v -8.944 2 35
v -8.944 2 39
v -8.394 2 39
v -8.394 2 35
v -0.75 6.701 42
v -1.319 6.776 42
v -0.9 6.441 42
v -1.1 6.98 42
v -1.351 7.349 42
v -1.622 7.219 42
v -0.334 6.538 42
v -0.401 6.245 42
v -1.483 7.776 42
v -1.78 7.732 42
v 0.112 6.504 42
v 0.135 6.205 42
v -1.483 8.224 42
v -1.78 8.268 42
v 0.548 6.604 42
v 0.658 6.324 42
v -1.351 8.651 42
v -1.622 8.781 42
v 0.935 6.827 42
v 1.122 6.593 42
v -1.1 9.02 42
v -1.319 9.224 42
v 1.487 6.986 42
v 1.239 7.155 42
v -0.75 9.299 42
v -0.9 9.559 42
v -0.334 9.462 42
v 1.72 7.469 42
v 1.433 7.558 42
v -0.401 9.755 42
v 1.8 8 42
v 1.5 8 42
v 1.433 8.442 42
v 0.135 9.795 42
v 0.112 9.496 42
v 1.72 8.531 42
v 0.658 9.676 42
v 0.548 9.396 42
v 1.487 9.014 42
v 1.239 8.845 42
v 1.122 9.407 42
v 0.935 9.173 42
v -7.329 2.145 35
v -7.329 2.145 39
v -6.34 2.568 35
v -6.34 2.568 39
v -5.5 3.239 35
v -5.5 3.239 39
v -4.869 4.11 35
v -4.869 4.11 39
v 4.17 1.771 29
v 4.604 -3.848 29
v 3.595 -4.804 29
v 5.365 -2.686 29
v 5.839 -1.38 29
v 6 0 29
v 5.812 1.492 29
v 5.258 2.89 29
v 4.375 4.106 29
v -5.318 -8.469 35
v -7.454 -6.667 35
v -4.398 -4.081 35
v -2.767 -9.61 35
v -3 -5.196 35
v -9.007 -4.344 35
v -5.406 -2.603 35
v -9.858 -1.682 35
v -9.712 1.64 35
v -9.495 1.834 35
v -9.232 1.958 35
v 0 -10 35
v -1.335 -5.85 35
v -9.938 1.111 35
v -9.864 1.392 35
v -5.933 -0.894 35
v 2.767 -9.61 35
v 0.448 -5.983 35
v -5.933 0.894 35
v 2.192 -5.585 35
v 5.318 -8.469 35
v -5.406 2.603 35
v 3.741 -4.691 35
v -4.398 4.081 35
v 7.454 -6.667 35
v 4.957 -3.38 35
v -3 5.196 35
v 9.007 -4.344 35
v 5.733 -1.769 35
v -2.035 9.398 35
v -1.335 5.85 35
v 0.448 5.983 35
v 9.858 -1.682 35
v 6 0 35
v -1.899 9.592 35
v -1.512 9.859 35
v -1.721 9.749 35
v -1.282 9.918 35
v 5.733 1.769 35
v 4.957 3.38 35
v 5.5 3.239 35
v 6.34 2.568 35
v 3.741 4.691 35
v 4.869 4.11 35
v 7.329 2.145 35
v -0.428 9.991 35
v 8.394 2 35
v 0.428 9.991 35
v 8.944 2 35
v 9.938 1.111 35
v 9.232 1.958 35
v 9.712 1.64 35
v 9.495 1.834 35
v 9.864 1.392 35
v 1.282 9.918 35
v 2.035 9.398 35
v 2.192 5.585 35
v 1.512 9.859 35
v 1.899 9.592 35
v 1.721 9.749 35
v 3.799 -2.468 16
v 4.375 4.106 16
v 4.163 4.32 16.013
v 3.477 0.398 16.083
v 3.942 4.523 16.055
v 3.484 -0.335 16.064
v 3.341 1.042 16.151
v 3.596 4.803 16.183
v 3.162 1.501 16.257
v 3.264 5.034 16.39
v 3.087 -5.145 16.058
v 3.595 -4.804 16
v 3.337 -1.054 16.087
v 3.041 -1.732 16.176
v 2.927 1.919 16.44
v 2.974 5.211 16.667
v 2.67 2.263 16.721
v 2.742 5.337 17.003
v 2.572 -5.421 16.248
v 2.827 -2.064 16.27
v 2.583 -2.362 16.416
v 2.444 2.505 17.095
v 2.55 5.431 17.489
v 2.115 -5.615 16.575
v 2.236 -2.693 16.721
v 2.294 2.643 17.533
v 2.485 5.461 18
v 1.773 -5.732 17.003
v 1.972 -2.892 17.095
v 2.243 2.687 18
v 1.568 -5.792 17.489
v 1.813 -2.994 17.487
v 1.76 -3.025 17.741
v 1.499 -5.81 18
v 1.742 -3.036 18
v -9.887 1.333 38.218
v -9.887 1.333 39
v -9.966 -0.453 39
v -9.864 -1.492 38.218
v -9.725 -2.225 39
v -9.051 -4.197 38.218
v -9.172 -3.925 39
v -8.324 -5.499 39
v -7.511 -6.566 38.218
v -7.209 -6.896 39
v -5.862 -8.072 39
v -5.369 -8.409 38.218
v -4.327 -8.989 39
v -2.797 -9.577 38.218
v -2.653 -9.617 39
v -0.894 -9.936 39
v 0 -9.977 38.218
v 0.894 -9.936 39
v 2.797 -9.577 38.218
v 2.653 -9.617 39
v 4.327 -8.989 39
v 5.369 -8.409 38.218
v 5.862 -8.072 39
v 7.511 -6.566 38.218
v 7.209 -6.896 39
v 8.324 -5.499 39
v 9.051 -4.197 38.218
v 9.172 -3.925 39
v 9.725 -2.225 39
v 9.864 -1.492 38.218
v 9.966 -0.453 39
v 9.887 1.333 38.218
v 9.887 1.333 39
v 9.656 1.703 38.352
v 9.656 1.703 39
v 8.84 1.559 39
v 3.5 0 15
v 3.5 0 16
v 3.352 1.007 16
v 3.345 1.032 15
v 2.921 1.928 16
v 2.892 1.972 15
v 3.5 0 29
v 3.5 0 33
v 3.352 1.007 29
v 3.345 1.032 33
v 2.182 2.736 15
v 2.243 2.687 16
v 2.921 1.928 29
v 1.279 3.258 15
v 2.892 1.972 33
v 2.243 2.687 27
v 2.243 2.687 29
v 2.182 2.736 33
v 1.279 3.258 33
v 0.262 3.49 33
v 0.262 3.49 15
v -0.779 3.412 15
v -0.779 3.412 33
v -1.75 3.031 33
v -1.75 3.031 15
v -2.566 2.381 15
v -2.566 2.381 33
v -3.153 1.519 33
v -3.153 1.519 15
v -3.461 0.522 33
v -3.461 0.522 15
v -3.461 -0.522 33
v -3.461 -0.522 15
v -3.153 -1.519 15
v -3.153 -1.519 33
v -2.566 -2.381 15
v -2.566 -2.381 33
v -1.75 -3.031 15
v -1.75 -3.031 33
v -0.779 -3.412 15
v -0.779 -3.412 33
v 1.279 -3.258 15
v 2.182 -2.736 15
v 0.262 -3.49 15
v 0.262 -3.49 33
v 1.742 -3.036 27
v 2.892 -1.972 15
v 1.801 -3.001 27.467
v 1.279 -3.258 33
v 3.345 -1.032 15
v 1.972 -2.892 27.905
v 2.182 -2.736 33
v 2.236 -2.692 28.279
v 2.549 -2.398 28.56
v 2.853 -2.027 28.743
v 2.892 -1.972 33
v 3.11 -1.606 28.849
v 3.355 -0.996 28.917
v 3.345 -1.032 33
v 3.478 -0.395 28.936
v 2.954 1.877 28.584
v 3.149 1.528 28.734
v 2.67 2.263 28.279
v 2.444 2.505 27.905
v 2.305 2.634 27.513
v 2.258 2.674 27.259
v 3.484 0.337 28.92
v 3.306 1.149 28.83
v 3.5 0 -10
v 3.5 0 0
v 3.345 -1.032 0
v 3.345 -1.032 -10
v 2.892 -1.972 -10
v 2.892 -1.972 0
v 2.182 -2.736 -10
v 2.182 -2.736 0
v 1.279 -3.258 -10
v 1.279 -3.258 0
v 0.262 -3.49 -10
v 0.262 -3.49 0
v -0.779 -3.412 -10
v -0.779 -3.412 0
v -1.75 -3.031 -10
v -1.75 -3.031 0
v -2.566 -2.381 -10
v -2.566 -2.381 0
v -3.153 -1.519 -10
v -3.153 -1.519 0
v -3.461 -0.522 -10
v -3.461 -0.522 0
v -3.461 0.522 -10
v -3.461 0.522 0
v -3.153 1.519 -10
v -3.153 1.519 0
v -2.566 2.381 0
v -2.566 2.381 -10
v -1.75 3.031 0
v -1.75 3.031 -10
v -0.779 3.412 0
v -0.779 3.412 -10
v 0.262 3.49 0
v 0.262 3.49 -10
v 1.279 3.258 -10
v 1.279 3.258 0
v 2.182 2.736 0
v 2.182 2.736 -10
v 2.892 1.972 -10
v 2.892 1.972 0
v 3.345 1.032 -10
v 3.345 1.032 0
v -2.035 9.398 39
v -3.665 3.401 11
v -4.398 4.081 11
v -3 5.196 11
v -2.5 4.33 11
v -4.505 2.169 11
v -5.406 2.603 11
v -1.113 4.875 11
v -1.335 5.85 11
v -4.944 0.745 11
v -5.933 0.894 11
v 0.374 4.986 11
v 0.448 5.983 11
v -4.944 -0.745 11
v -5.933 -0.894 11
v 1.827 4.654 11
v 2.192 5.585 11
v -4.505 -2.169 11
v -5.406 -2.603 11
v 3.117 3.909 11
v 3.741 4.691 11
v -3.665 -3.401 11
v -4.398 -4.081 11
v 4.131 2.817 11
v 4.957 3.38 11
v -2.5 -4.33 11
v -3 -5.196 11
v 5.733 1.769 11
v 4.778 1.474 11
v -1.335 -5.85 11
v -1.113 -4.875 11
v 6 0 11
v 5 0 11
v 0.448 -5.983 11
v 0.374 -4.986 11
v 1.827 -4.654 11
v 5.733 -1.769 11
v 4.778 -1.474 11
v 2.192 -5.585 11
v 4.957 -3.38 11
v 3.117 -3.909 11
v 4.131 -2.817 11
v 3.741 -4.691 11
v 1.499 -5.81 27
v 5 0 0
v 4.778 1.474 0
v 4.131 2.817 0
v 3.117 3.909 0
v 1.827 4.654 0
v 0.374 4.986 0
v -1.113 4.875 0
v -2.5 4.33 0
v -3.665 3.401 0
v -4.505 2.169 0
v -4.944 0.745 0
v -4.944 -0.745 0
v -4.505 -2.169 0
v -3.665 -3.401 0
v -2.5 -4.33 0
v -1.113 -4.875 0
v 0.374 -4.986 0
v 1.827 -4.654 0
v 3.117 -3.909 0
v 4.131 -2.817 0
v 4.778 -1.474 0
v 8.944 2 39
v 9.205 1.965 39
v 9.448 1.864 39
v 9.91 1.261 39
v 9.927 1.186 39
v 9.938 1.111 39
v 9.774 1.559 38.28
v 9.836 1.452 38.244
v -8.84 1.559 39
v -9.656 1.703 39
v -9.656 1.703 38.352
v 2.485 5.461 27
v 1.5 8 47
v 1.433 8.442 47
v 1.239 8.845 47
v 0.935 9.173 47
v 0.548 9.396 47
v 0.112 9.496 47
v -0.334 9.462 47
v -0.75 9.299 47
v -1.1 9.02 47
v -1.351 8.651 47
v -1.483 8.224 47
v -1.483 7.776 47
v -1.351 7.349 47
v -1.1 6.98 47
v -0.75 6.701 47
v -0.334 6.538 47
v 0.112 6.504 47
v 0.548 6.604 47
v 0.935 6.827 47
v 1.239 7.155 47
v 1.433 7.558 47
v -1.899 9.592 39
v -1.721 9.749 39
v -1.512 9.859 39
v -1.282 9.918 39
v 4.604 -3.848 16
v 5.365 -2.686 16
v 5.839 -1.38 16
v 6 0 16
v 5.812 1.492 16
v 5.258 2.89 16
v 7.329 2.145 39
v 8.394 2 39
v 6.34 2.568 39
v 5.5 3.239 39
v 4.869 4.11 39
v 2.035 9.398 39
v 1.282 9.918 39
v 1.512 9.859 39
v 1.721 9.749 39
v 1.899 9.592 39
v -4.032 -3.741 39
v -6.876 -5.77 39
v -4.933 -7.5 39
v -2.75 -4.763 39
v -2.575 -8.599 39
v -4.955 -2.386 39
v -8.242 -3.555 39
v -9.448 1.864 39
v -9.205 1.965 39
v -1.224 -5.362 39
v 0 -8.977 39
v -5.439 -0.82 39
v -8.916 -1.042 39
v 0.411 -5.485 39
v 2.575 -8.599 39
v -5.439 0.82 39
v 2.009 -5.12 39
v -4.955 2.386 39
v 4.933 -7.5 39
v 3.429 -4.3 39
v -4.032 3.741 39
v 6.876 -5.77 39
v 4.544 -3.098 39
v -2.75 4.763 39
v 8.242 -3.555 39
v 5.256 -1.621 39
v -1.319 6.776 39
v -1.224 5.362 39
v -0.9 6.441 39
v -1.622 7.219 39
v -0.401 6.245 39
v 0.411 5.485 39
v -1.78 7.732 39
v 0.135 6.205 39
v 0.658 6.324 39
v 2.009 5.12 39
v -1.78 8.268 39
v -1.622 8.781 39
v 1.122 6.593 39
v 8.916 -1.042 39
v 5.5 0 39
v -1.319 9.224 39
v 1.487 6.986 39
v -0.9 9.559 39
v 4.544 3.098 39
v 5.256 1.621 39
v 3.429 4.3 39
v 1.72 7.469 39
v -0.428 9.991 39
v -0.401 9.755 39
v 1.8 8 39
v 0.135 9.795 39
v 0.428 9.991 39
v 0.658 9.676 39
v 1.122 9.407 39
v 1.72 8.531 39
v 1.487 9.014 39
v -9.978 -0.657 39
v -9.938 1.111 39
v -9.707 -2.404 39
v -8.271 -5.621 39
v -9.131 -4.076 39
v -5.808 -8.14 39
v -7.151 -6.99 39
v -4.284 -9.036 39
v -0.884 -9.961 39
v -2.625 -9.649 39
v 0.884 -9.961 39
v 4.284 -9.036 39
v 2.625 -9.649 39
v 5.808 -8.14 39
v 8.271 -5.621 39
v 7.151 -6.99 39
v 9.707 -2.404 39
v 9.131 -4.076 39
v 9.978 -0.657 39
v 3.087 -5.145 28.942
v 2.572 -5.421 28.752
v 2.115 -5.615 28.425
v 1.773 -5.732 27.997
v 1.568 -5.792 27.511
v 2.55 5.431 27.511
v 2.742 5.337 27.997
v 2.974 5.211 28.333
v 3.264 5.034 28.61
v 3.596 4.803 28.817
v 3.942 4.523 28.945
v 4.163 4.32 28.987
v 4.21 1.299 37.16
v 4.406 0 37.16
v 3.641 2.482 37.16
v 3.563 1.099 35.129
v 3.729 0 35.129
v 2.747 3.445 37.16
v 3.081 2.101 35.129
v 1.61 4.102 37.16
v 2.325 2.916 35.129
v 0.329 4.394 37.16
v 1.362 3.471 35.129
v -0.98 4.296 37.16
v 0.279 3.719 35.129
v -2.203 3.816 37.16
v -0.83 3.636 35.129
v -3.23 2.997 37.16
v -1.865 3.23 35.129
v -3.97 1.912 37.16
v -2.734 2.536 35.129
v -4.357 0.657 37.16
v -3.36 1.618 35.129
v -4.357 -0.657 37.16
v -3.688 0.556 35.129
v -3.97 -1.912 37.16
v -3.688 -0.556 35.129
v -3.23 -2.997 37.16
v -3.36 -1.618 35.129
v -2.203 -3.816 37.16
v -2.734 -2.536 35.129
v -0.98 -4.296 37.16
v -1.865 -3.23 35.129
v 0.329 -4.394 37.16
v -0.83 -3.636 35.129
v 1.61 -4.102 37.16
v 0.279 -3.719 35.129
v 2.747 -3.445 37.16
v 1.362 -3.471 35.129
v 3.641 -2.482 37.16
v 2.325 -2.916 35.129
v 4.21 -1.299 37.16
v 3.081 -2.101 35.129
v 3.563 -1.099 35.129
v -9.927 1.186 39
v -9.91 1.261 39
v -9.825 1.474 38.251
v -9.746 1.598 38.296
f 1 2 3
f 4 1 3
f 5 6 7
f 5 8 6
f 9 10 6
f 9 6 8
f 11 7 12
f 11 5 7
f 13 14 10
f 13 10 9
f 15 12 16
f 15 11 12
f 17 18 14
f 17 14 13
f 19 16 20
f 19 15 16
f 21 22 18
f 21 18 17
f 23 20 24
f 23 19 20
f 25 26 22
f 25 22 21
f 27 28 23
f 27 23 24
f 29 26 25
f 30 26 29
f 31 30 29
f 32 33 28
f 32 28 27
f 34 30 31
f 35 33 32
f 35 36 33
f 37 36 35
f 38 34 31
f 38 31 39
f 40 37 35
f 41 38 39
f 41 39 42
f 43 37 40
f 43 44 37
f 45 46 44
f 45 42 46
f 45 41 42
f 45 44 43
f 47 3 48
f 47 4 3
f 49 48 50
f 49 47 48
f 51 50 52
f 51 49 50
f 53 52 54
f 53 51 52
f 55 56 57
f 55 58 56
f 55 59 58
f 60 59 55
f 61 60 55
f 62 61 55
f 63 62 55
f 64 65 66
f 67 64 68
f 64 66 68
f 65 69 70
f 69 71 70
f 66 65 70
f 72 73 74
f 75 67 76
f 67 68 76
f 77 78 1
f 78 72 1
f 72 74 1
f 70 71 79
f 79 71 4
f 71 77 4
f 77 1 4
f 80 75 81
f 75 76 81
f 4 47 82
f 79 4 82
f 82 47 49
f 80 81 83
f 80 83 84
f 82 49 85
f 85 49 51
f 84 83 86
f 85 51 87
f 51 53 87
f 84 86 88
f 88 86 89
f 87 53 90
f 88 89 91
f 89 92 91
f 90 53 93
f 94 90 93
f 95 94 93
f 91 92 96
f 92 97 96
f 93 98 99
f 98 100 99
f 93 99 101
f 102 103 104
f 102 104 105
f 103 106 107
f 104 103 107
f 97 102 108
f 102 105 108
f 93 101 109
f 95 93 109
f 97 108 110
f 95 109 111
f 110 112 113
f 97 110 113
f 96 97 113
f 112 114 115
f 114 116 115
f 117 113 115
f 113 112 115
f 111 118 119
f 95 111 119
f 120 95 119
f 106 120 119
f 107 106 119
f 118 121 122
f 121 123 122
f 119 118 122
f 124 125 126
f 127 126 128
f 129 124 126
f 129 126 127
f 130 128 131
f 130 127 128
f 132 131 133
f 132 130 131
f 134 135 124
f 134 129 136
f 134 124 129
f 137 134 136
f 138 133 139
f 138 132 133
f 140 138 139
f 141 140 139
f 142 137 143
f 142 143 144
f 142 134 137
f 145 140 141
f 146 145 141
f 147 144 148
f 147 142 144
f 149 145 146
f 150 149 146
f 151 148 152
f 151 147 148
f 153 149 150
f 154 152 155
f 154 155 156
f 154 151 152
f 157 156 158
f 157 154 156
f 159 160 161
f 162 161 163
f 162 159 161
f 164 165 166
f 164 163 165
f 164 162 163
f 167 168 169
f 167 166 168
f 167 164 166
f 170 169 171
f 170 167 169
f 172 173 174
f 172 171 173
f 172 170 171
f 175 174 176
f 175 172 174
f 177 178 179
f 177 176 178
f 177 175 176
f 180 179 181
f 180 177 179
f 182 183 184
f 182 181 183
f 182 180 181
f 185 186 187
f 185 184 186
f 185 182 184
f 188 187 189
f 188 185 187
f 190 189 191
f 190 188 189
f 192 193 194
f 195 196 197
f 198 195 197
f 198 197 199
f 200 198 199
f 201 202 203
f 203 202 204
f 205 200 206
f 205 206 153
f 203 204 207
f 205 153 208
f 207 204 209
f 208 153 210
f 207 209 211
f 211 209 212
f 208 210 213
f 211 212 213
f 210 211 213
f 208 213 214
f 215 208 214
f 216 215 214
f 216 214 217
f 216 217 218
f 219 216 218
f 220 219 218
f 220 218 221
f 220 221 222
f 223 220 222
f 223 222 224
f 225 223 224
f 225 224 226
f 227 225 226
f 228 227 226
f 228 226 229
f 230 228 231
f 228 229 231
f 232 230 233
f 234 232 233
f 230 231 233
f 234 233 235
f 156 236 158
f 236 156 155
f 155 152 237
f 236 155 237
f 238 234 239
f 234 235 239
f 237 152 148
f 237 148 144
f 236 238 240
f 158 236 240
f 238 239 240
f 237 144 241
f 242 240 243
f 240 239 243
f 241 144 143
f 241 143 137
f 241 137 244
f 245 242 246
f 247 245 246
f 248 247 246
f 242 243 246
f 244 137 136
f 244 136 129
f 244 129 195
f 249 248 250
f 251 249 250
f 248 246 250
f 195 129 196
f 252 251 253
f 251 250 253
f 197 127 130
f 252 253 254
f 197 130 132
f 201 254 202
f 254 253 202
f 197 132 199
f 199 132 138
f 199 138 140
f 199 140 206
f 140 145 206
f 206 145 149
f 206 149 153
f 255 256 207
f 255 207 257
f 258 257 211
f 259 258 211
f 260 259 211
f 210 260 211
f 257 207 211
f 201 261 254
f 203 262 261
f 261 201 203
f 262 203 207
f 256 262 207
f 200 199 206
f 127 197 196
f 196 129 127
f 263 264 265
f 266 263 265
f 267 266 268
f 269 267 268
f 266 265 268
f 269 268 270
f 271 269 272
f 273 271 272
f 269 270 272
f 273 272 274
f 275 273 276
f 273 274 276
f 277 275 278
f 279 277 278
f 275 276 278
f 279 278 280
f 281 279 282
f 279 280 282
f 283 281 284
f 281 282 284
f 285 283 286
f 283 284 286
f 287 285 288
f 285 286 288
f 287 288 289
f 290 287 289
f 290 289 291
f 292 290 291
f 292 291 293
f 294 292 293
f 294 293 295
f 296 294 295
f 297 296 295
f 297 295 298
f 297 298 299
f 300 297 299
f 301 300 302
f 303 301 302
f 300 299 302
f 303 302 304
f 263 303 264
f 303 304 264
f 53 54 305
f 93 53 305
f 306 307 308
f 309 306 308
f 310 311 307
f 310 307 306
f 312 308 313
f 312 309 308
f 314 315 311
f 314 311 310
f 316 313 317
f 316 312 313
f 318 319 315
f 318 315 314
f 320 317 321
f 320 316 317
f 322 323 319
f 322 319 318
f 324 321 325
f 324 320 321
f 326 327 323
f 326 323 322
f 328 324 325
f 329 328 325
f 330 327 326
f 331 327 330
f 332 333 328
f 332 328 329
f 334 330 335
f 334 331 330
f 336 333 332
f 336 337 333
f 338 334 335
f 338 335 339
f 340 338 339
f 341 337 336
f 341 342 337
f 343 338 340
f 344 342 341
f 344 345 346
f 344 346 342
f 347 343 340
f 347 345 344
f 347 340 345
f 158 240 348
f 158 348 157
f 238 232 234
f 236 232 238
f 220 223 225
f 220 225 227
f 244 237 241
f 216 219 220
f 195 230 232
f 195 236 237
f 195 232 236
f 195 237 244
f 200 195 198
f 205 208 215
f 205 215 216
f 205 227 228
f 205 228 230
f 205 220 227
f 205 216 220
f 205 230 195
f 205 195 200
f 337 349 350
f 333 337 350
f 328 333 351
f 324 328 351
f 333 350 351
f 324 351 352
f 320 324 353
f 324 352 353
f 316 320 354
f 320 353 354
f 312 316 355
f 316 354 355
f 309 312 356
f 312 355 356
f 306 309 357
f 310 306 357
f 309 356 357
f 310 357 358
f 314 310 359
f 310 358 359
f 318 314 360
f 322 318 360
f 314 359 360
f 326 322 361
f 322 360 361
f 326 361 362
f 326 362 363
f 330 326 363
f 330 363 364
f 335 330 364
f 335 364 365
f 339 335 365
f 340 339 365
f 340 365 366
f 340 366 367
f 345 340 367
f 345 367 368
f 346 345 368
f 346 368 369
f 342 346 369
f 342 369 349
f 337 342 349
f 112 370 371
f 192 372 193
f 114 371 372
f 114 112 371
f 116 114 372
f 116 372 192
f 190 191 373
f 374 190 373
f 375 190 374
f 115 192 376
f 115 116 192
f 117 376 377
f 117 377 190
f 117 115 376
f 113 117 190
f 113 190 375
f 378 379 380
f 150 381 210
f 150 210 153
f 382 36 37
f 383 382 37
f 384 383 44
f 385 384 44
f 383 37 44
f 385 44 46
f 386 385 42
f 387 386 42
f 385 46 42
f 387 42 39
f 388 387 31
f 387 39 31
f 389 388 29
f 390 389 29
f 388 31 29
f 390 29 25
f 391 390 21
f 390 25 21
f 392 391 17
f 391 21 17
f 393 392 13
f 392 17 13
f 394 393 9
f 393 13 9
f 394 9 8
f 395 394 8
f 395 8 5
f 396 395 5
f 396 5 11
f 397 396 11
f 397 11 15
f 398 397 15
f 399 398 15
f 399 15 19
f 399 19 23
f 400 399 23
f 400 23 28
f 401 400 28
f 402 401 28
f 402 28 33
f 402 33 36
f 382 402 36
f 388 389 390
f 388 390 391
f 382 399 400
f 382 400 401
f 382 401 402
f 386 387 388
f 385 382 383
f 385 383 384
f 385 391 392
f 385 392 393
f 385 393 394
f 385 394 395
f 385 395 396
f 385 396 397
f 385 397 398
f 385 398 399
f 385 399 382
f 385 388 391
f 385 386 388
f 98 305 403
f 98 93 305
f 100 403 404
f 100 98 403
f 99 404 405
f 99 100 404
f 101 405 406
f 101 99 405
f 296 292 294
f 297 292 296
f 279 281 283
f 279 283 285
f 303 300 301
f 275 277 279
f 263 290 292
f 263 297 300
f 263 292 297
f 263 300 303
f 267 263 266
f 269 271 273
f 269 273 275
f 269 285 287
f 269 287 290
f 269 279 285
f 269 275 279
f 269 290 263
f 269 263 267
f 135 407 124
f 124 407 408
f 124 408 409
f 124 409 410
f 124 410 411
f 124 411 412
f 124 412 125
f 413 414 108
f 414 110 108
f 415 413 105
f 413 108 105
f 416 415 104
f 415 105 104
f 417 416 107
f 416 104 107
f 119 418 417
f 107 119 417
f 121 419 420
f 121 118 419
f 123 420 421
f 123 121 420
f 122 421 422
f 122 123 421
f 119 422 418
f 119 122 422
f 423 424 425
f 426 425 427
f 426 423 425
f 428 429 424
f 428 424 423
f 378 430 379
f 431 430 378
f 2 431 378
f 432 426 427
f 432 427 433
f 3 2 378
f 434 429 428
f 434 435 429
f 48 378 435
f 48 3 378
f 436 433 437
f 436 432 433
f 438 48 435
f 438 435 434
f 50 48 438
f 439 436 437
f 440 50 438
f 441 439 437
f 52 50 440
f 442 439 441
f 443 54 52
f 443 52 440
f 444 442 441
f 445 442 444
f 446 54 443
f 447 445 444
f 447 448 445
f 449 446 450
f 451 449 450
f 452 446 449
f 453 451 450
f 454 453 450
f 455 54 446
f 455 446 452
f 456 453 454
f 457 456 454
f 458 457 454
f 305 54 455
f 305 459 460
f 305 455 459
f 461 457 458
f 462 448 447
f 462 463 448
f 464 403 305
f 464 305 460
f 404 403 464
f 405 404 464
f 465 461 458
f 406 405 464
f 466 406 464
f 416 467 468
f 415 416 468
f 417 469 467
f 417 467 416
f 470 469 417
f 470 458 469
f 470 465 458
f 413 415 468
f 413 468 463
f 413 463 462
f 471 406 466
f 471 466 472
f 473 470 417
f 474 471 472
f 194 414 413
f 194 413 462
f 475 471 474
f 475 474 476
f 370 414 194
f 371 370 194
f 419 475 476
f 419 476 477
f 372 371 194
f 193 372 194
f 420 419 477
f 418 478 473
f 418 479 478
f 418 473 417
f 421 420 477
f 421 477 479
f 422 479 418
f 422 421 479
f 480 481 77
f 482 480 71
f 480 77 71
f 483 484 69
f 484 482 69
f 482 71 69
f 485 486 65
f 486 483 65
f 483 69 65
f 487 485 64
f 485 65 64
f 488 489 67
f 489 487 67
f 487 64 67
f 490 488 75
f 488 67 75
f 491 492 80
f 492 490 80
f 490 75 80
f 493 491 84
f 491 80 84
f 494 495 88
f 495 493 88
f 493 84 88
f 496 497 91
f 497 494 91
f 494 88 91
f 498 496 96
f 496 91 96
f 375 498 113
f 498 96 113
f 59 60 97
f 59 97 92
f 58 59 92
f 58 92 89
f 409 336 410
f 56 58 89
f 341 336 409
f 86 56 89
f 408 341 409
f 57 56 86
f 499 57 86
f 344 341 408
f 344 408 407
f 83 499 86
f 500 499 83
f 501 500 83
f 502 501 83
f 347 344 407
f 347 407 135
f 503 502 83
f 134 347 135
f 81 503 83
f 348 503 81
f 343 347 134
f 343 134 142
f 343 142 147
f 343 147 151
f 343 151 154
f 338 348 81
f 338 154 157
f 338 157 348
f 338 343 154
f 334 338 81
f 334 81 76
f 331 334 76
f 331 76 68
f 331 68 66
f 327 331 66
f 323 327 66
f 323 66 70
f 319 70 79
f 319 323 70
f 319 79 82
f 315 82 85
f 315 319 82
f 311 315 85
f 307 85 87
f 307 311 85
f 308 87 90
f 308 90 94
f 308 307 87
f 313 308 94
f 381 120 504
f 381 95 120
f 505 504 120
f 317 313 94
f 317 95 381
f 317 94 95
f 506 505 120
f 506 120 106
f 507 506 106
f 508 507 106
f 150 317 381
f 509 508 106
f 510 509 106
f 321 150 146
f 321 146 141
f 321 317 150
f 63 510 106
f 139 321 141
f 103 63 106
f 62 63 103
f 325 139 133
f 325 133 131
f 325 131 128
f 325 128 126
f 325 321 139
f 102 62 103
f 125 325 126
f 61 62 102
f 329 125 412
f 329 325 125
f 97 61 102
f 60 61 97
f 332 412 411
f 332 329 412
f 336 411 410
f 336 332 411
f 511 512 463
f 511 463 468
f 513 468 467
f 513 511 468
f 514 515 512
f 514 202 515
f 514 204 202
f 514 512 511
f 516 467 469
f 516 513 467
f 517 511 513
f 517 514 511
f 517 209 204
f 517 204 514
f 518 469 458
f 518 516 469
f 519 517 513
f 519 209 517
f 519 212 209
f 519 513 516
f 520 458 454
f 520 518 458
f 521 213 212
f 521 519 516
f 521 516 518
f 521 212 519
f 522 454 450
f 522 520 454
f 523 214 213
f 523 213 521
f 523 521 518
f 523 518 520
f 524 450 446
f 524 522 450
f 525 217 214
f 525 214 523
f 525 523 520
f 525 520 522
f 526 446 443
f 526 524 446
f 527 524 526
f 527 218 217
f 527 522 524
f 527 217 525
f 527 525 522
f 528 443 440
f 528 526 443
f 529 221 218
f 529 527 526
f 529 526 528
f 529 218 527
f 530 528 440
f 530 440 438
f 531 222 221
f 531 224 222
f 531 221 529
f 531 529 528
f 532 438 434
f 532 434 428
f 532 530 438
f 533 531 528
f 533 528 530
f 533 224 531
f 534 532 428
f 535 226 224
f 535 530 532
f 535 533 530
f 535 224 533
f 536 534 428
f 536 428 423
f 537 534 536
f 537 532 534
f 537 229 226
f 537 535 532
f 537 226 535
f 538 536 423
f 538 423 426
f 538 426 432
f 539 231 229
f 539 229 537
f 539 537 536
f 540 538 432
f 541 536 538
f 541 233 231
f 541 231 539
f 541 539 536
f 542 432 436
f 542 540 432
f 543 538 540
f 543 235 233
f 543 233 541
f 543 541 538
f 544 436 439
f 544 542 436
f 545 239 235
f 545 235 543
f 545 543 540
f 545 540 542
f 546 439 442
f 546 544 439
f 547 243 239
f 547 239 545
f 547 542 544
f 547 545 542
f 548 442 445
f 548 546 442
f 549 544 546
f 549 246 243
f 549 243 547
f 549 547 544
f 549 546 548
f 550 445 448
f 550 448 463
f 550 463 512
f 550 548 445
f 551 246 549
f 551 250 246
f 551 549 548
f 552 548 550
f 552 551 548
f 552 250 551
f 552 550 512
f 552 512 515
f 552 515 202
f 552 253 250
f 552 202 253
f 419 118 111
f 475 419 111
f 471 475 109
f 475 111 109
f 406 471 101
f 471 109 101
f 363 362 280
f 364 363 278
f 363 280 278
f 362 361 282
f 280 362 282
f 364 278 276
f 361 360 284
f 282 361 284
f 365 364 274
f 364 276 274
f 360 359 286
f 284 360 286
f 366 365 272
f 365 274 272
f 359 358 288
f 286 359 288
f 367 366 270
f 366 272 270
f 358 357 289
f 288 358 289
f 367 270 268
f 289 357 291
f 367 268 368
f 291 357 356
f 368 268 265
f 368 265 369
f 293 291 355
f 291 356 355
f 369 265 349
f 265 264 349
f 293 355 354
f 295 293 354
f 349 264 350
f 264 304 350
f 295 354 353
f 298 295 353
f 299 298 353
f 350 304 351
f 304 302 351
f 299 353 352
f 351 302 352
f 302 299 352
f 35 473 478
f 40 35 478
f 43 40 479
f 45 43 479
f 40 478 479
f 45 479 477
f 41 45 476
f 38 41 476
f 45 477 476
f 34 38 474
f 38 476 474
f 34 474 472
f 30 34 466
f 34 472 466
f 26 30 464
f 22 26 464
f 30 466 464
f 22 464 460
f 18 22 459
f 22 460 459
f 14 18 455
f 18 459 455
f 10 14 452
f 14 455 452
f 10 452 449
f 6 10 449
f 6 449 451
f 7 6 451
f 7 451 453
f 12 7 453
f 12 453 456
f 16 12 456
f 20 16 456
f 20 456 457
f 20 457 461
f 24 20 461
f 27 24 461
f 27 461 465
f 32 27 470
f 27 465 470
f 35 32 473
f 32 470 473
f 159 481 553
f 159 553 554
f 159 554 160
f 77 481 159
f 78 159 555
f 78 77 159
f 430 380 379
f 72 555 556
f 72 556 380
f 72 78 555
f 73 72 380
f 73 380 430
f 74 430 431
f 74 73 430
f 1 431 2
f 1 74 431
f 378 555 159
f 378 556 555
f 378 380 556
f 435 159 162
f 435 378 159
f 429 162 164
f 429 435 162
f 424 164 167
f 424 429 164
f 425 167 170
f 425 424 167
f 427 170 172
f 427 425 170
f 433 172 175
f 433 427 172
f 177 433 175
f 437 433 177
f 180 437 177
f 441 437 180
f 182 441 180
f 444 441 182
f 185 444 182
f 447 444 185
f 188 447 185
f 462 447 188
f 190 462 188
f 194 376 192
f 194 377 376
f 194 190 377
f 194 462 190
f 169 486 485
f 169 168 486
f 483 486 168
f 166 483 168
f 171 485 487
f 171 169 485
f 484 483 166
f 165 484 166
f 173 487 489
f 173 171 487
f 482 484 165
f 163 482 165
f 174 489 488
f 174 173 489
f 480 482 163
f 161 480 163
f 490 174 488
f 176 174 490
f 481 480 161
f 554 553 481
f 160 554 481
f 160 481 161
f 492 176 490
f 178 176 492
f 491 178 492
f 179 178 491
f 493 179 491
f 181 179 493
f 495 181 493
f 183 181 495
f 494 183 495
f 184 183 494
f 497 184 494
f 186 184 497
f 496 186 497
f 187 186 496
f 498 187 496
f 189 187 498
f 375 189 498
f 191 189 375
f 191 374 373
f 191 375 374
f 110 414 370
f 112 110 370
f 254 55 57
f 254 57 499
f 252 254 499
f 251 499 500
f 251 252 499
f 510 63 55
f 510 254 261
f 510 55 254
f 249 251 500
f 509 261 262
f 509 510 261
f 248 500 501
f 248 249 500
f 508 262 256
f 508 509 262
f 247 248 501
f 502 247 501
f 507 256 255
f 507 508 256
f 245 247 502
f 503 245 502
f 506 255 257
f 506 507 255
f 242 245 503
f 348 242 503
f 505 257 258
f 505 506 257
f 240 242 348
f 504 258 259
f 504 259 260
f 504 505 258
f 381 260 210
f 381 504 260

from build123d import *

# Parameters (mm, degrees)
SKETCH1_R           = 5
BOSS_EXTRUDE1_DEPTH = 35
SKETCH3_R           = 10
BOSS_EXTRUDE3_DEPTH = 4
BOSS_EXTRUDE4_START = 24
SKETCH4_R           = 6
SKETCH4_R_2         = 5
BOSS_EXTRUDE4_DEPTH = 24
CUT_EXTRUDE1_DEPTH  = 42.484937025
FILLET1_R           = 1
SKETCH6_R           = 3.5
CUT_EXTRUDE2_DEPTH  = 24
CHAMFER1_SIZE       = 2
FILLET2_R           = 10
SKETCH7_R           = 1.5
BOSS_EXTRUDE5_DEPTH = 8
FILLET3_R           = 4
CUT_REVOLVE1_ANGLE  = 200
SKETCH9_R           = 1.8
SKETCH9_R_2         = 1.5
BOSS_EXTRUDE6_DEPTH = 3
SKETCH10_R          = 3.5
BOSS_EXTRUDE7_DEPTH = 10
SKETCH14_W          = 13
SKETCH14_H          = 12
CUT_EXTRUDE3_DEPTH  = 4
FILLET4_R           = 2


with BuildPart() as part:
    # Sketch1 → Boss-Extrude1 (new body)
    with BuildSketch(Plane.XY):
        Circle(SKETCH1_R)
    extrude(amount=BOSS_EXTRUDE1_DEPTH)

    # Sketch3 → Boss-Extrude3 (add)
    with BuildSketch(Plane.XY.offset(35)):
        Circle(SKETCH3_R)
    extrude(amount=BOSS_EXTRUDE3_DEPTH)

    # Sketch4 → Boss-Extrude4 (add)
    with BuildSketch(Plane(origin=(0, 0, 35), x_dir=(-1, 0, 0), z_dir=(0, 0, -1)).offset(BOSS_EXTRUDE4_START)):
        with Locations(Location((0, 0, 0), (0, 0, 180))):
            Circle(SKETCH4_R)
        Circle(SKETCH4_R_2, mode=Mode.SUBTRACT)
    extrude(amount=-BOSS_EXTRUDE4_DEPTH)

    # Sketch5 → Cut-Extrude1 (cut, through all)
    with BuildSketch(Plane.XY.offset(39)):
        with BuildLine():
            ThreePointArc((-1.8, 9.836666102), (-6.99867823, 7.142723782), (-9.797958971, 2))
            Line((-9.797958971, 2), (-6, 2))
            Line((-6, 2), (-1.8, 9.836666102))
        make_face()
        with BuildLine():
            ThreePointArc((9.797958971, 2), (6.99867823, 7.142723782), (1.8, 9.836666102))
            Line((1.8, 9.836666102), (6, 2))
            Line((6, 2), (9.797958971, 2))
        make_face()
    extrude(amount=-CUT_EXTRUDE1_DEPTH, mode=Mode.SUBTRACT)

    # Fillet1
    fillet1_edges = [part.edges().sort_by_distance(p)[0] for p in [
        (-9.797958971, 2, 37),
        (-1.8, 9.836666102, 37),
        (1.8, 9.836666102, 37),
        (9.797958971, 2, 37),
    ]]
    fillet(fillet1_edges, radius=FILLET1_R)

    # Sketch6 → Cut-Extrude2 (cut)
    with BuildSketch(Plane.XY.offset(39)):
        Circle(SKETCH6_R)
    extrude(amount=-CUT_EXTRUDE2_DEPTH, mode=Mode.SUBTRACT)

    # Chamfer1
    chamfer1_edges = [part.edges().sort_by_distance(p)[0] for p in [
        (-3.5, 0, 39),
    ]]
    chamfer(chamfer1_edges, length=CHAMFER1_SIZE)

    # Fillet2
    # the kernel refuses this fillet: 10 mm, written as the material it takes off along each edge
    with BuildSketch(Plane(origin=(0, 0, 37), x_dir=(1, 0, 0), z_dir=(0, -1, 0))) as fillet2_piece_1:
        with BuildLine():
            CenterArc((13.5, -4), FILLET2_R, 143.130102354, 36.869897646)
            Line((3.5, -4), (3.3, -4))
            Line((3.3, -4), (3.3, 0))
            Line((3.3, 0), (3.358578644, 0.141421356))
            ThreePointArc((3.358578644, 0.141421356), (4.358578644, 1.141421356), (5.34, 2.12))
            Line((5.34, 2.12), (5.5, 2))
        make_face()
    revolve(axis=Axis((0, 0, 37), (0, 0, 1)), mode=Mode.SUBTRACT)

    # Sketch7 → Boss-Extrude5 (add)
    with BuildSketch(Plane.XY.offset(39)):
        with Locations((0, 8)):
            Circle(SKETCH7_R)
    extrude(amount=BOSS_EXTRUDE5_DEPTH)

    # Fillet3
    fillet3_edges = [part.edges().sort_by_distance(p)[0] for p in [
        (-6, 2, 37),
        (6, 2, 37),
    ]]
    fillet(fillet3_edges, radius=FILLET3_R)

    # Sketch8 → Cut-Revolve1 (revolve, symmetric, cut)
    with BuildSketch(Plane(origin=(0, 0, 0), x_dir=(0, 0, -1), z_dir=(1, 0, 0))) as cut_revolve1_sk:
        Polygon((-38.217890117, -9.976578367), (-39, -8.976578367), (-39, -9.976578367), align=None)
    revolve(axis=Axis((0, 0, 1000), (0, 0, -1)), revolution_arc=CUT_REVOLVE1_ANGLE / 2, mode=Mode.SUBTRACT)
    revolve(cut_revolve1_sk.sketch, axis=Axis((0, 0, 1000), (0, 0, 1)), revolution_arc=CUT_REVOLVE1_ANGLE / 2, mode=Mode.SUBTRACT)

    # Sketch9 → Boss-Extrude6 (add)
    with BuildSketch(Plane.XY.offset(39)):
        with Locations((0, 8)):
            Circle(SKETCH9_R)
        with Locations((0, 8)):
            Circle(SKETCH9_R_2, mode=Mode.SUBTRACT)
    extrude(amount=BOSS_EXTRUDE6_DEPTH)

    # Sketch10 → Boss-Extrude7 (add)
    with BuildSketch(Plane(origin=(0, 0, 0), x_dir=(-1, 0, 0), z_dir=(0, 0, -1))):
        with Locations(Location((0, 0, 0), (0, 0, 180))):
            Circle(SKETCH10_R)
    extrude(amount=BOSS_EXTRUDE7_DEPTH)

    # Sketch14 → Cut-Extrude3 (cut)
    with BuildSketch(Plane(origin=(5.977168189, -0.522934456, 0), x_dir=(0, 0, -1), z_dir=(0.9961946980917453, -0.08715574274766187, 0))):
        with Locations((-22.5, 0)):
            Rectangle(SKETCH14_W, SKETCH14_H)
    extrude(amount=-CUT_EXTRUDE3_DEPTH, mode=Mode.SUBTRACT)

    # Fillet4
    # the kernel refuses this fillet: 2 mm, written as the material it adds along each edge
    with BuildSketch(Plane(origin=(1.806946495, -2.29393355, 16), x_dir=(0, 0, 1), z_dir=(0.08715574274766187, 0.9961946980917453, 0))) as fillet4_piece_1_section:
        with BuildLine():
            CenterArc((FILLET4_R, FILLET4_R), FILLET4_R, 180, 90)
            Line((0, FILLET4_R), (0, 0))
            Line((0, 0), (FILLET4_R, 0))
        make_face()
    fillet4_piece_1 = extrude(amount=12.784572926, mode=Mode.PRIVATE)
    fillet4_piece_1 = fillet4_piece_1 - Plane(origin=(0, 0, 16.407191897), x_dir=(1, 0, 0), z_dir=(0, 0, 1)) * Cylinder(3.5, 34, mode=Mode.PRIVATE)
    fillet4_piece_1 = fillet4_piece_1 & Plane(origin=(0, 0, 16.407191897), x_dir=(1, 0, 0), z_dir=(0, 0, -1)) * Cylinder(6, 34, mode=Mode.PRIVATE)
    add(fillet4_piece_1)
    with BuildSketch(Plane(origin=(1.063583349, -10.790613187, 16), x_dir=(0.9961946980917453, -0.08715574274766187, 0), z_dir=(0.08715574274766187, 0.9961946980917453, 0))) as fillet4_piece_2_section:
        with BuildLine():
            CenterArc((FILLET4_R, -FILLET4_R), FILLET4_R, 90, 90)
            Line((0, -FILLET4_R), (0, 0))
            Line((0, 0), (FILLET4_R, 0))
        make_face()
    fillet4_piece_2 = extrude(amount=12.784572926, mode=Mode.PRIVATE)
    fillet4_piece_2 = fillet4_piece_2 - Plane(origin=(0, 0, 16.407193431), x_dir=(1, 0, 0), z_dir=(0, 0, 1)) * Cylinder(3.5, 34, mode=Mode.PRIVATE)
    fillet4_piece_2 = fillet4_piece_2 & Plane(origin=(0, 0, 16.407193431), x_dir=(1, 0, 0), z_dir=(0, 0, -1)) * Cylinder(6, 34, mode=Mode.PRIVATE)
    add(fillet4_piece_2)
    with BuildSketch(Plane(origin=(2.177832298, 1.945310579, 29), x_dir=(0, 0, -1), z_dir=(-0.08715574274766187, -0.9961946980917453, 0))) as fillet4_piece_3_section:
        with BuildLine():
            CenterArc((FILLET4_R, FILLET4_R), FILLET4_R, 180, 90)
            Line((0, FILLET4_R), (0, 0))
            Line((0, 0), (FILLET4_R, 0))
        make_face()
    fillet4_piece_3 = extrude(amount=12.784572926, mode=Mode.PRIVATE)
    fillet4_piece_3 = fillet4_piece_3 - Plane(origin=(0, 0, 28.592806917), x_dir=(1, 0, 0), z_dir=(0, 0, 1)) * Cylinder(3.5, 34, mode=Mode.PRIVATE)
    fillet4_piece_3 = fillet4_piece_3 & Plane(origin=(0, 0, 28.592806917), x_dir=(1, 0, 0), z_dir=(0, 0, -1)) * Cylinder(6, 34, mode=Mode.PRIVATE)
    add(fillet4_piece_3)
    with BuildSketch(Plane(origin=(2.921195444, 10.441990216, 29), x_dir=(0, 0, -1), z_dir=(-0.08715574274766187, -0.9961946980917453, 0))) as fillet4_piece_4_section:
        with BuildLine():
            CenterArc((FILLET4_R, FILLET4_R), FILLET4_R, 180, 90)
            Line((0, FILLET4_R), (0, 0))
            Line((0, 0), (FILLET4_R, 0))
        make_face()
    fillet4_piece_4 = extrude(amount=12.784572926, mode=Mode.PRIVATE)
    fillet4_piece_4 = fillet4_piece_4 - Plane(origin=(0, 0, 28.592808103), x_dir=(1, 0, 0), z_dir=(0, 0, 1)) * Cylinder(3.5, 34, mode=Mode.PRIVATE)
    fillet4_piece_4 = fillet4_piece_4 & Plane(origin=(0, 0, 28.592808103), x_dir=(1, 0, 0), z_dir=(0, 0, -1)) * Cylinder(6, 34, mode=Mode.PRIVATE)
    add(fillet4_piece_4)


solid = part.part
